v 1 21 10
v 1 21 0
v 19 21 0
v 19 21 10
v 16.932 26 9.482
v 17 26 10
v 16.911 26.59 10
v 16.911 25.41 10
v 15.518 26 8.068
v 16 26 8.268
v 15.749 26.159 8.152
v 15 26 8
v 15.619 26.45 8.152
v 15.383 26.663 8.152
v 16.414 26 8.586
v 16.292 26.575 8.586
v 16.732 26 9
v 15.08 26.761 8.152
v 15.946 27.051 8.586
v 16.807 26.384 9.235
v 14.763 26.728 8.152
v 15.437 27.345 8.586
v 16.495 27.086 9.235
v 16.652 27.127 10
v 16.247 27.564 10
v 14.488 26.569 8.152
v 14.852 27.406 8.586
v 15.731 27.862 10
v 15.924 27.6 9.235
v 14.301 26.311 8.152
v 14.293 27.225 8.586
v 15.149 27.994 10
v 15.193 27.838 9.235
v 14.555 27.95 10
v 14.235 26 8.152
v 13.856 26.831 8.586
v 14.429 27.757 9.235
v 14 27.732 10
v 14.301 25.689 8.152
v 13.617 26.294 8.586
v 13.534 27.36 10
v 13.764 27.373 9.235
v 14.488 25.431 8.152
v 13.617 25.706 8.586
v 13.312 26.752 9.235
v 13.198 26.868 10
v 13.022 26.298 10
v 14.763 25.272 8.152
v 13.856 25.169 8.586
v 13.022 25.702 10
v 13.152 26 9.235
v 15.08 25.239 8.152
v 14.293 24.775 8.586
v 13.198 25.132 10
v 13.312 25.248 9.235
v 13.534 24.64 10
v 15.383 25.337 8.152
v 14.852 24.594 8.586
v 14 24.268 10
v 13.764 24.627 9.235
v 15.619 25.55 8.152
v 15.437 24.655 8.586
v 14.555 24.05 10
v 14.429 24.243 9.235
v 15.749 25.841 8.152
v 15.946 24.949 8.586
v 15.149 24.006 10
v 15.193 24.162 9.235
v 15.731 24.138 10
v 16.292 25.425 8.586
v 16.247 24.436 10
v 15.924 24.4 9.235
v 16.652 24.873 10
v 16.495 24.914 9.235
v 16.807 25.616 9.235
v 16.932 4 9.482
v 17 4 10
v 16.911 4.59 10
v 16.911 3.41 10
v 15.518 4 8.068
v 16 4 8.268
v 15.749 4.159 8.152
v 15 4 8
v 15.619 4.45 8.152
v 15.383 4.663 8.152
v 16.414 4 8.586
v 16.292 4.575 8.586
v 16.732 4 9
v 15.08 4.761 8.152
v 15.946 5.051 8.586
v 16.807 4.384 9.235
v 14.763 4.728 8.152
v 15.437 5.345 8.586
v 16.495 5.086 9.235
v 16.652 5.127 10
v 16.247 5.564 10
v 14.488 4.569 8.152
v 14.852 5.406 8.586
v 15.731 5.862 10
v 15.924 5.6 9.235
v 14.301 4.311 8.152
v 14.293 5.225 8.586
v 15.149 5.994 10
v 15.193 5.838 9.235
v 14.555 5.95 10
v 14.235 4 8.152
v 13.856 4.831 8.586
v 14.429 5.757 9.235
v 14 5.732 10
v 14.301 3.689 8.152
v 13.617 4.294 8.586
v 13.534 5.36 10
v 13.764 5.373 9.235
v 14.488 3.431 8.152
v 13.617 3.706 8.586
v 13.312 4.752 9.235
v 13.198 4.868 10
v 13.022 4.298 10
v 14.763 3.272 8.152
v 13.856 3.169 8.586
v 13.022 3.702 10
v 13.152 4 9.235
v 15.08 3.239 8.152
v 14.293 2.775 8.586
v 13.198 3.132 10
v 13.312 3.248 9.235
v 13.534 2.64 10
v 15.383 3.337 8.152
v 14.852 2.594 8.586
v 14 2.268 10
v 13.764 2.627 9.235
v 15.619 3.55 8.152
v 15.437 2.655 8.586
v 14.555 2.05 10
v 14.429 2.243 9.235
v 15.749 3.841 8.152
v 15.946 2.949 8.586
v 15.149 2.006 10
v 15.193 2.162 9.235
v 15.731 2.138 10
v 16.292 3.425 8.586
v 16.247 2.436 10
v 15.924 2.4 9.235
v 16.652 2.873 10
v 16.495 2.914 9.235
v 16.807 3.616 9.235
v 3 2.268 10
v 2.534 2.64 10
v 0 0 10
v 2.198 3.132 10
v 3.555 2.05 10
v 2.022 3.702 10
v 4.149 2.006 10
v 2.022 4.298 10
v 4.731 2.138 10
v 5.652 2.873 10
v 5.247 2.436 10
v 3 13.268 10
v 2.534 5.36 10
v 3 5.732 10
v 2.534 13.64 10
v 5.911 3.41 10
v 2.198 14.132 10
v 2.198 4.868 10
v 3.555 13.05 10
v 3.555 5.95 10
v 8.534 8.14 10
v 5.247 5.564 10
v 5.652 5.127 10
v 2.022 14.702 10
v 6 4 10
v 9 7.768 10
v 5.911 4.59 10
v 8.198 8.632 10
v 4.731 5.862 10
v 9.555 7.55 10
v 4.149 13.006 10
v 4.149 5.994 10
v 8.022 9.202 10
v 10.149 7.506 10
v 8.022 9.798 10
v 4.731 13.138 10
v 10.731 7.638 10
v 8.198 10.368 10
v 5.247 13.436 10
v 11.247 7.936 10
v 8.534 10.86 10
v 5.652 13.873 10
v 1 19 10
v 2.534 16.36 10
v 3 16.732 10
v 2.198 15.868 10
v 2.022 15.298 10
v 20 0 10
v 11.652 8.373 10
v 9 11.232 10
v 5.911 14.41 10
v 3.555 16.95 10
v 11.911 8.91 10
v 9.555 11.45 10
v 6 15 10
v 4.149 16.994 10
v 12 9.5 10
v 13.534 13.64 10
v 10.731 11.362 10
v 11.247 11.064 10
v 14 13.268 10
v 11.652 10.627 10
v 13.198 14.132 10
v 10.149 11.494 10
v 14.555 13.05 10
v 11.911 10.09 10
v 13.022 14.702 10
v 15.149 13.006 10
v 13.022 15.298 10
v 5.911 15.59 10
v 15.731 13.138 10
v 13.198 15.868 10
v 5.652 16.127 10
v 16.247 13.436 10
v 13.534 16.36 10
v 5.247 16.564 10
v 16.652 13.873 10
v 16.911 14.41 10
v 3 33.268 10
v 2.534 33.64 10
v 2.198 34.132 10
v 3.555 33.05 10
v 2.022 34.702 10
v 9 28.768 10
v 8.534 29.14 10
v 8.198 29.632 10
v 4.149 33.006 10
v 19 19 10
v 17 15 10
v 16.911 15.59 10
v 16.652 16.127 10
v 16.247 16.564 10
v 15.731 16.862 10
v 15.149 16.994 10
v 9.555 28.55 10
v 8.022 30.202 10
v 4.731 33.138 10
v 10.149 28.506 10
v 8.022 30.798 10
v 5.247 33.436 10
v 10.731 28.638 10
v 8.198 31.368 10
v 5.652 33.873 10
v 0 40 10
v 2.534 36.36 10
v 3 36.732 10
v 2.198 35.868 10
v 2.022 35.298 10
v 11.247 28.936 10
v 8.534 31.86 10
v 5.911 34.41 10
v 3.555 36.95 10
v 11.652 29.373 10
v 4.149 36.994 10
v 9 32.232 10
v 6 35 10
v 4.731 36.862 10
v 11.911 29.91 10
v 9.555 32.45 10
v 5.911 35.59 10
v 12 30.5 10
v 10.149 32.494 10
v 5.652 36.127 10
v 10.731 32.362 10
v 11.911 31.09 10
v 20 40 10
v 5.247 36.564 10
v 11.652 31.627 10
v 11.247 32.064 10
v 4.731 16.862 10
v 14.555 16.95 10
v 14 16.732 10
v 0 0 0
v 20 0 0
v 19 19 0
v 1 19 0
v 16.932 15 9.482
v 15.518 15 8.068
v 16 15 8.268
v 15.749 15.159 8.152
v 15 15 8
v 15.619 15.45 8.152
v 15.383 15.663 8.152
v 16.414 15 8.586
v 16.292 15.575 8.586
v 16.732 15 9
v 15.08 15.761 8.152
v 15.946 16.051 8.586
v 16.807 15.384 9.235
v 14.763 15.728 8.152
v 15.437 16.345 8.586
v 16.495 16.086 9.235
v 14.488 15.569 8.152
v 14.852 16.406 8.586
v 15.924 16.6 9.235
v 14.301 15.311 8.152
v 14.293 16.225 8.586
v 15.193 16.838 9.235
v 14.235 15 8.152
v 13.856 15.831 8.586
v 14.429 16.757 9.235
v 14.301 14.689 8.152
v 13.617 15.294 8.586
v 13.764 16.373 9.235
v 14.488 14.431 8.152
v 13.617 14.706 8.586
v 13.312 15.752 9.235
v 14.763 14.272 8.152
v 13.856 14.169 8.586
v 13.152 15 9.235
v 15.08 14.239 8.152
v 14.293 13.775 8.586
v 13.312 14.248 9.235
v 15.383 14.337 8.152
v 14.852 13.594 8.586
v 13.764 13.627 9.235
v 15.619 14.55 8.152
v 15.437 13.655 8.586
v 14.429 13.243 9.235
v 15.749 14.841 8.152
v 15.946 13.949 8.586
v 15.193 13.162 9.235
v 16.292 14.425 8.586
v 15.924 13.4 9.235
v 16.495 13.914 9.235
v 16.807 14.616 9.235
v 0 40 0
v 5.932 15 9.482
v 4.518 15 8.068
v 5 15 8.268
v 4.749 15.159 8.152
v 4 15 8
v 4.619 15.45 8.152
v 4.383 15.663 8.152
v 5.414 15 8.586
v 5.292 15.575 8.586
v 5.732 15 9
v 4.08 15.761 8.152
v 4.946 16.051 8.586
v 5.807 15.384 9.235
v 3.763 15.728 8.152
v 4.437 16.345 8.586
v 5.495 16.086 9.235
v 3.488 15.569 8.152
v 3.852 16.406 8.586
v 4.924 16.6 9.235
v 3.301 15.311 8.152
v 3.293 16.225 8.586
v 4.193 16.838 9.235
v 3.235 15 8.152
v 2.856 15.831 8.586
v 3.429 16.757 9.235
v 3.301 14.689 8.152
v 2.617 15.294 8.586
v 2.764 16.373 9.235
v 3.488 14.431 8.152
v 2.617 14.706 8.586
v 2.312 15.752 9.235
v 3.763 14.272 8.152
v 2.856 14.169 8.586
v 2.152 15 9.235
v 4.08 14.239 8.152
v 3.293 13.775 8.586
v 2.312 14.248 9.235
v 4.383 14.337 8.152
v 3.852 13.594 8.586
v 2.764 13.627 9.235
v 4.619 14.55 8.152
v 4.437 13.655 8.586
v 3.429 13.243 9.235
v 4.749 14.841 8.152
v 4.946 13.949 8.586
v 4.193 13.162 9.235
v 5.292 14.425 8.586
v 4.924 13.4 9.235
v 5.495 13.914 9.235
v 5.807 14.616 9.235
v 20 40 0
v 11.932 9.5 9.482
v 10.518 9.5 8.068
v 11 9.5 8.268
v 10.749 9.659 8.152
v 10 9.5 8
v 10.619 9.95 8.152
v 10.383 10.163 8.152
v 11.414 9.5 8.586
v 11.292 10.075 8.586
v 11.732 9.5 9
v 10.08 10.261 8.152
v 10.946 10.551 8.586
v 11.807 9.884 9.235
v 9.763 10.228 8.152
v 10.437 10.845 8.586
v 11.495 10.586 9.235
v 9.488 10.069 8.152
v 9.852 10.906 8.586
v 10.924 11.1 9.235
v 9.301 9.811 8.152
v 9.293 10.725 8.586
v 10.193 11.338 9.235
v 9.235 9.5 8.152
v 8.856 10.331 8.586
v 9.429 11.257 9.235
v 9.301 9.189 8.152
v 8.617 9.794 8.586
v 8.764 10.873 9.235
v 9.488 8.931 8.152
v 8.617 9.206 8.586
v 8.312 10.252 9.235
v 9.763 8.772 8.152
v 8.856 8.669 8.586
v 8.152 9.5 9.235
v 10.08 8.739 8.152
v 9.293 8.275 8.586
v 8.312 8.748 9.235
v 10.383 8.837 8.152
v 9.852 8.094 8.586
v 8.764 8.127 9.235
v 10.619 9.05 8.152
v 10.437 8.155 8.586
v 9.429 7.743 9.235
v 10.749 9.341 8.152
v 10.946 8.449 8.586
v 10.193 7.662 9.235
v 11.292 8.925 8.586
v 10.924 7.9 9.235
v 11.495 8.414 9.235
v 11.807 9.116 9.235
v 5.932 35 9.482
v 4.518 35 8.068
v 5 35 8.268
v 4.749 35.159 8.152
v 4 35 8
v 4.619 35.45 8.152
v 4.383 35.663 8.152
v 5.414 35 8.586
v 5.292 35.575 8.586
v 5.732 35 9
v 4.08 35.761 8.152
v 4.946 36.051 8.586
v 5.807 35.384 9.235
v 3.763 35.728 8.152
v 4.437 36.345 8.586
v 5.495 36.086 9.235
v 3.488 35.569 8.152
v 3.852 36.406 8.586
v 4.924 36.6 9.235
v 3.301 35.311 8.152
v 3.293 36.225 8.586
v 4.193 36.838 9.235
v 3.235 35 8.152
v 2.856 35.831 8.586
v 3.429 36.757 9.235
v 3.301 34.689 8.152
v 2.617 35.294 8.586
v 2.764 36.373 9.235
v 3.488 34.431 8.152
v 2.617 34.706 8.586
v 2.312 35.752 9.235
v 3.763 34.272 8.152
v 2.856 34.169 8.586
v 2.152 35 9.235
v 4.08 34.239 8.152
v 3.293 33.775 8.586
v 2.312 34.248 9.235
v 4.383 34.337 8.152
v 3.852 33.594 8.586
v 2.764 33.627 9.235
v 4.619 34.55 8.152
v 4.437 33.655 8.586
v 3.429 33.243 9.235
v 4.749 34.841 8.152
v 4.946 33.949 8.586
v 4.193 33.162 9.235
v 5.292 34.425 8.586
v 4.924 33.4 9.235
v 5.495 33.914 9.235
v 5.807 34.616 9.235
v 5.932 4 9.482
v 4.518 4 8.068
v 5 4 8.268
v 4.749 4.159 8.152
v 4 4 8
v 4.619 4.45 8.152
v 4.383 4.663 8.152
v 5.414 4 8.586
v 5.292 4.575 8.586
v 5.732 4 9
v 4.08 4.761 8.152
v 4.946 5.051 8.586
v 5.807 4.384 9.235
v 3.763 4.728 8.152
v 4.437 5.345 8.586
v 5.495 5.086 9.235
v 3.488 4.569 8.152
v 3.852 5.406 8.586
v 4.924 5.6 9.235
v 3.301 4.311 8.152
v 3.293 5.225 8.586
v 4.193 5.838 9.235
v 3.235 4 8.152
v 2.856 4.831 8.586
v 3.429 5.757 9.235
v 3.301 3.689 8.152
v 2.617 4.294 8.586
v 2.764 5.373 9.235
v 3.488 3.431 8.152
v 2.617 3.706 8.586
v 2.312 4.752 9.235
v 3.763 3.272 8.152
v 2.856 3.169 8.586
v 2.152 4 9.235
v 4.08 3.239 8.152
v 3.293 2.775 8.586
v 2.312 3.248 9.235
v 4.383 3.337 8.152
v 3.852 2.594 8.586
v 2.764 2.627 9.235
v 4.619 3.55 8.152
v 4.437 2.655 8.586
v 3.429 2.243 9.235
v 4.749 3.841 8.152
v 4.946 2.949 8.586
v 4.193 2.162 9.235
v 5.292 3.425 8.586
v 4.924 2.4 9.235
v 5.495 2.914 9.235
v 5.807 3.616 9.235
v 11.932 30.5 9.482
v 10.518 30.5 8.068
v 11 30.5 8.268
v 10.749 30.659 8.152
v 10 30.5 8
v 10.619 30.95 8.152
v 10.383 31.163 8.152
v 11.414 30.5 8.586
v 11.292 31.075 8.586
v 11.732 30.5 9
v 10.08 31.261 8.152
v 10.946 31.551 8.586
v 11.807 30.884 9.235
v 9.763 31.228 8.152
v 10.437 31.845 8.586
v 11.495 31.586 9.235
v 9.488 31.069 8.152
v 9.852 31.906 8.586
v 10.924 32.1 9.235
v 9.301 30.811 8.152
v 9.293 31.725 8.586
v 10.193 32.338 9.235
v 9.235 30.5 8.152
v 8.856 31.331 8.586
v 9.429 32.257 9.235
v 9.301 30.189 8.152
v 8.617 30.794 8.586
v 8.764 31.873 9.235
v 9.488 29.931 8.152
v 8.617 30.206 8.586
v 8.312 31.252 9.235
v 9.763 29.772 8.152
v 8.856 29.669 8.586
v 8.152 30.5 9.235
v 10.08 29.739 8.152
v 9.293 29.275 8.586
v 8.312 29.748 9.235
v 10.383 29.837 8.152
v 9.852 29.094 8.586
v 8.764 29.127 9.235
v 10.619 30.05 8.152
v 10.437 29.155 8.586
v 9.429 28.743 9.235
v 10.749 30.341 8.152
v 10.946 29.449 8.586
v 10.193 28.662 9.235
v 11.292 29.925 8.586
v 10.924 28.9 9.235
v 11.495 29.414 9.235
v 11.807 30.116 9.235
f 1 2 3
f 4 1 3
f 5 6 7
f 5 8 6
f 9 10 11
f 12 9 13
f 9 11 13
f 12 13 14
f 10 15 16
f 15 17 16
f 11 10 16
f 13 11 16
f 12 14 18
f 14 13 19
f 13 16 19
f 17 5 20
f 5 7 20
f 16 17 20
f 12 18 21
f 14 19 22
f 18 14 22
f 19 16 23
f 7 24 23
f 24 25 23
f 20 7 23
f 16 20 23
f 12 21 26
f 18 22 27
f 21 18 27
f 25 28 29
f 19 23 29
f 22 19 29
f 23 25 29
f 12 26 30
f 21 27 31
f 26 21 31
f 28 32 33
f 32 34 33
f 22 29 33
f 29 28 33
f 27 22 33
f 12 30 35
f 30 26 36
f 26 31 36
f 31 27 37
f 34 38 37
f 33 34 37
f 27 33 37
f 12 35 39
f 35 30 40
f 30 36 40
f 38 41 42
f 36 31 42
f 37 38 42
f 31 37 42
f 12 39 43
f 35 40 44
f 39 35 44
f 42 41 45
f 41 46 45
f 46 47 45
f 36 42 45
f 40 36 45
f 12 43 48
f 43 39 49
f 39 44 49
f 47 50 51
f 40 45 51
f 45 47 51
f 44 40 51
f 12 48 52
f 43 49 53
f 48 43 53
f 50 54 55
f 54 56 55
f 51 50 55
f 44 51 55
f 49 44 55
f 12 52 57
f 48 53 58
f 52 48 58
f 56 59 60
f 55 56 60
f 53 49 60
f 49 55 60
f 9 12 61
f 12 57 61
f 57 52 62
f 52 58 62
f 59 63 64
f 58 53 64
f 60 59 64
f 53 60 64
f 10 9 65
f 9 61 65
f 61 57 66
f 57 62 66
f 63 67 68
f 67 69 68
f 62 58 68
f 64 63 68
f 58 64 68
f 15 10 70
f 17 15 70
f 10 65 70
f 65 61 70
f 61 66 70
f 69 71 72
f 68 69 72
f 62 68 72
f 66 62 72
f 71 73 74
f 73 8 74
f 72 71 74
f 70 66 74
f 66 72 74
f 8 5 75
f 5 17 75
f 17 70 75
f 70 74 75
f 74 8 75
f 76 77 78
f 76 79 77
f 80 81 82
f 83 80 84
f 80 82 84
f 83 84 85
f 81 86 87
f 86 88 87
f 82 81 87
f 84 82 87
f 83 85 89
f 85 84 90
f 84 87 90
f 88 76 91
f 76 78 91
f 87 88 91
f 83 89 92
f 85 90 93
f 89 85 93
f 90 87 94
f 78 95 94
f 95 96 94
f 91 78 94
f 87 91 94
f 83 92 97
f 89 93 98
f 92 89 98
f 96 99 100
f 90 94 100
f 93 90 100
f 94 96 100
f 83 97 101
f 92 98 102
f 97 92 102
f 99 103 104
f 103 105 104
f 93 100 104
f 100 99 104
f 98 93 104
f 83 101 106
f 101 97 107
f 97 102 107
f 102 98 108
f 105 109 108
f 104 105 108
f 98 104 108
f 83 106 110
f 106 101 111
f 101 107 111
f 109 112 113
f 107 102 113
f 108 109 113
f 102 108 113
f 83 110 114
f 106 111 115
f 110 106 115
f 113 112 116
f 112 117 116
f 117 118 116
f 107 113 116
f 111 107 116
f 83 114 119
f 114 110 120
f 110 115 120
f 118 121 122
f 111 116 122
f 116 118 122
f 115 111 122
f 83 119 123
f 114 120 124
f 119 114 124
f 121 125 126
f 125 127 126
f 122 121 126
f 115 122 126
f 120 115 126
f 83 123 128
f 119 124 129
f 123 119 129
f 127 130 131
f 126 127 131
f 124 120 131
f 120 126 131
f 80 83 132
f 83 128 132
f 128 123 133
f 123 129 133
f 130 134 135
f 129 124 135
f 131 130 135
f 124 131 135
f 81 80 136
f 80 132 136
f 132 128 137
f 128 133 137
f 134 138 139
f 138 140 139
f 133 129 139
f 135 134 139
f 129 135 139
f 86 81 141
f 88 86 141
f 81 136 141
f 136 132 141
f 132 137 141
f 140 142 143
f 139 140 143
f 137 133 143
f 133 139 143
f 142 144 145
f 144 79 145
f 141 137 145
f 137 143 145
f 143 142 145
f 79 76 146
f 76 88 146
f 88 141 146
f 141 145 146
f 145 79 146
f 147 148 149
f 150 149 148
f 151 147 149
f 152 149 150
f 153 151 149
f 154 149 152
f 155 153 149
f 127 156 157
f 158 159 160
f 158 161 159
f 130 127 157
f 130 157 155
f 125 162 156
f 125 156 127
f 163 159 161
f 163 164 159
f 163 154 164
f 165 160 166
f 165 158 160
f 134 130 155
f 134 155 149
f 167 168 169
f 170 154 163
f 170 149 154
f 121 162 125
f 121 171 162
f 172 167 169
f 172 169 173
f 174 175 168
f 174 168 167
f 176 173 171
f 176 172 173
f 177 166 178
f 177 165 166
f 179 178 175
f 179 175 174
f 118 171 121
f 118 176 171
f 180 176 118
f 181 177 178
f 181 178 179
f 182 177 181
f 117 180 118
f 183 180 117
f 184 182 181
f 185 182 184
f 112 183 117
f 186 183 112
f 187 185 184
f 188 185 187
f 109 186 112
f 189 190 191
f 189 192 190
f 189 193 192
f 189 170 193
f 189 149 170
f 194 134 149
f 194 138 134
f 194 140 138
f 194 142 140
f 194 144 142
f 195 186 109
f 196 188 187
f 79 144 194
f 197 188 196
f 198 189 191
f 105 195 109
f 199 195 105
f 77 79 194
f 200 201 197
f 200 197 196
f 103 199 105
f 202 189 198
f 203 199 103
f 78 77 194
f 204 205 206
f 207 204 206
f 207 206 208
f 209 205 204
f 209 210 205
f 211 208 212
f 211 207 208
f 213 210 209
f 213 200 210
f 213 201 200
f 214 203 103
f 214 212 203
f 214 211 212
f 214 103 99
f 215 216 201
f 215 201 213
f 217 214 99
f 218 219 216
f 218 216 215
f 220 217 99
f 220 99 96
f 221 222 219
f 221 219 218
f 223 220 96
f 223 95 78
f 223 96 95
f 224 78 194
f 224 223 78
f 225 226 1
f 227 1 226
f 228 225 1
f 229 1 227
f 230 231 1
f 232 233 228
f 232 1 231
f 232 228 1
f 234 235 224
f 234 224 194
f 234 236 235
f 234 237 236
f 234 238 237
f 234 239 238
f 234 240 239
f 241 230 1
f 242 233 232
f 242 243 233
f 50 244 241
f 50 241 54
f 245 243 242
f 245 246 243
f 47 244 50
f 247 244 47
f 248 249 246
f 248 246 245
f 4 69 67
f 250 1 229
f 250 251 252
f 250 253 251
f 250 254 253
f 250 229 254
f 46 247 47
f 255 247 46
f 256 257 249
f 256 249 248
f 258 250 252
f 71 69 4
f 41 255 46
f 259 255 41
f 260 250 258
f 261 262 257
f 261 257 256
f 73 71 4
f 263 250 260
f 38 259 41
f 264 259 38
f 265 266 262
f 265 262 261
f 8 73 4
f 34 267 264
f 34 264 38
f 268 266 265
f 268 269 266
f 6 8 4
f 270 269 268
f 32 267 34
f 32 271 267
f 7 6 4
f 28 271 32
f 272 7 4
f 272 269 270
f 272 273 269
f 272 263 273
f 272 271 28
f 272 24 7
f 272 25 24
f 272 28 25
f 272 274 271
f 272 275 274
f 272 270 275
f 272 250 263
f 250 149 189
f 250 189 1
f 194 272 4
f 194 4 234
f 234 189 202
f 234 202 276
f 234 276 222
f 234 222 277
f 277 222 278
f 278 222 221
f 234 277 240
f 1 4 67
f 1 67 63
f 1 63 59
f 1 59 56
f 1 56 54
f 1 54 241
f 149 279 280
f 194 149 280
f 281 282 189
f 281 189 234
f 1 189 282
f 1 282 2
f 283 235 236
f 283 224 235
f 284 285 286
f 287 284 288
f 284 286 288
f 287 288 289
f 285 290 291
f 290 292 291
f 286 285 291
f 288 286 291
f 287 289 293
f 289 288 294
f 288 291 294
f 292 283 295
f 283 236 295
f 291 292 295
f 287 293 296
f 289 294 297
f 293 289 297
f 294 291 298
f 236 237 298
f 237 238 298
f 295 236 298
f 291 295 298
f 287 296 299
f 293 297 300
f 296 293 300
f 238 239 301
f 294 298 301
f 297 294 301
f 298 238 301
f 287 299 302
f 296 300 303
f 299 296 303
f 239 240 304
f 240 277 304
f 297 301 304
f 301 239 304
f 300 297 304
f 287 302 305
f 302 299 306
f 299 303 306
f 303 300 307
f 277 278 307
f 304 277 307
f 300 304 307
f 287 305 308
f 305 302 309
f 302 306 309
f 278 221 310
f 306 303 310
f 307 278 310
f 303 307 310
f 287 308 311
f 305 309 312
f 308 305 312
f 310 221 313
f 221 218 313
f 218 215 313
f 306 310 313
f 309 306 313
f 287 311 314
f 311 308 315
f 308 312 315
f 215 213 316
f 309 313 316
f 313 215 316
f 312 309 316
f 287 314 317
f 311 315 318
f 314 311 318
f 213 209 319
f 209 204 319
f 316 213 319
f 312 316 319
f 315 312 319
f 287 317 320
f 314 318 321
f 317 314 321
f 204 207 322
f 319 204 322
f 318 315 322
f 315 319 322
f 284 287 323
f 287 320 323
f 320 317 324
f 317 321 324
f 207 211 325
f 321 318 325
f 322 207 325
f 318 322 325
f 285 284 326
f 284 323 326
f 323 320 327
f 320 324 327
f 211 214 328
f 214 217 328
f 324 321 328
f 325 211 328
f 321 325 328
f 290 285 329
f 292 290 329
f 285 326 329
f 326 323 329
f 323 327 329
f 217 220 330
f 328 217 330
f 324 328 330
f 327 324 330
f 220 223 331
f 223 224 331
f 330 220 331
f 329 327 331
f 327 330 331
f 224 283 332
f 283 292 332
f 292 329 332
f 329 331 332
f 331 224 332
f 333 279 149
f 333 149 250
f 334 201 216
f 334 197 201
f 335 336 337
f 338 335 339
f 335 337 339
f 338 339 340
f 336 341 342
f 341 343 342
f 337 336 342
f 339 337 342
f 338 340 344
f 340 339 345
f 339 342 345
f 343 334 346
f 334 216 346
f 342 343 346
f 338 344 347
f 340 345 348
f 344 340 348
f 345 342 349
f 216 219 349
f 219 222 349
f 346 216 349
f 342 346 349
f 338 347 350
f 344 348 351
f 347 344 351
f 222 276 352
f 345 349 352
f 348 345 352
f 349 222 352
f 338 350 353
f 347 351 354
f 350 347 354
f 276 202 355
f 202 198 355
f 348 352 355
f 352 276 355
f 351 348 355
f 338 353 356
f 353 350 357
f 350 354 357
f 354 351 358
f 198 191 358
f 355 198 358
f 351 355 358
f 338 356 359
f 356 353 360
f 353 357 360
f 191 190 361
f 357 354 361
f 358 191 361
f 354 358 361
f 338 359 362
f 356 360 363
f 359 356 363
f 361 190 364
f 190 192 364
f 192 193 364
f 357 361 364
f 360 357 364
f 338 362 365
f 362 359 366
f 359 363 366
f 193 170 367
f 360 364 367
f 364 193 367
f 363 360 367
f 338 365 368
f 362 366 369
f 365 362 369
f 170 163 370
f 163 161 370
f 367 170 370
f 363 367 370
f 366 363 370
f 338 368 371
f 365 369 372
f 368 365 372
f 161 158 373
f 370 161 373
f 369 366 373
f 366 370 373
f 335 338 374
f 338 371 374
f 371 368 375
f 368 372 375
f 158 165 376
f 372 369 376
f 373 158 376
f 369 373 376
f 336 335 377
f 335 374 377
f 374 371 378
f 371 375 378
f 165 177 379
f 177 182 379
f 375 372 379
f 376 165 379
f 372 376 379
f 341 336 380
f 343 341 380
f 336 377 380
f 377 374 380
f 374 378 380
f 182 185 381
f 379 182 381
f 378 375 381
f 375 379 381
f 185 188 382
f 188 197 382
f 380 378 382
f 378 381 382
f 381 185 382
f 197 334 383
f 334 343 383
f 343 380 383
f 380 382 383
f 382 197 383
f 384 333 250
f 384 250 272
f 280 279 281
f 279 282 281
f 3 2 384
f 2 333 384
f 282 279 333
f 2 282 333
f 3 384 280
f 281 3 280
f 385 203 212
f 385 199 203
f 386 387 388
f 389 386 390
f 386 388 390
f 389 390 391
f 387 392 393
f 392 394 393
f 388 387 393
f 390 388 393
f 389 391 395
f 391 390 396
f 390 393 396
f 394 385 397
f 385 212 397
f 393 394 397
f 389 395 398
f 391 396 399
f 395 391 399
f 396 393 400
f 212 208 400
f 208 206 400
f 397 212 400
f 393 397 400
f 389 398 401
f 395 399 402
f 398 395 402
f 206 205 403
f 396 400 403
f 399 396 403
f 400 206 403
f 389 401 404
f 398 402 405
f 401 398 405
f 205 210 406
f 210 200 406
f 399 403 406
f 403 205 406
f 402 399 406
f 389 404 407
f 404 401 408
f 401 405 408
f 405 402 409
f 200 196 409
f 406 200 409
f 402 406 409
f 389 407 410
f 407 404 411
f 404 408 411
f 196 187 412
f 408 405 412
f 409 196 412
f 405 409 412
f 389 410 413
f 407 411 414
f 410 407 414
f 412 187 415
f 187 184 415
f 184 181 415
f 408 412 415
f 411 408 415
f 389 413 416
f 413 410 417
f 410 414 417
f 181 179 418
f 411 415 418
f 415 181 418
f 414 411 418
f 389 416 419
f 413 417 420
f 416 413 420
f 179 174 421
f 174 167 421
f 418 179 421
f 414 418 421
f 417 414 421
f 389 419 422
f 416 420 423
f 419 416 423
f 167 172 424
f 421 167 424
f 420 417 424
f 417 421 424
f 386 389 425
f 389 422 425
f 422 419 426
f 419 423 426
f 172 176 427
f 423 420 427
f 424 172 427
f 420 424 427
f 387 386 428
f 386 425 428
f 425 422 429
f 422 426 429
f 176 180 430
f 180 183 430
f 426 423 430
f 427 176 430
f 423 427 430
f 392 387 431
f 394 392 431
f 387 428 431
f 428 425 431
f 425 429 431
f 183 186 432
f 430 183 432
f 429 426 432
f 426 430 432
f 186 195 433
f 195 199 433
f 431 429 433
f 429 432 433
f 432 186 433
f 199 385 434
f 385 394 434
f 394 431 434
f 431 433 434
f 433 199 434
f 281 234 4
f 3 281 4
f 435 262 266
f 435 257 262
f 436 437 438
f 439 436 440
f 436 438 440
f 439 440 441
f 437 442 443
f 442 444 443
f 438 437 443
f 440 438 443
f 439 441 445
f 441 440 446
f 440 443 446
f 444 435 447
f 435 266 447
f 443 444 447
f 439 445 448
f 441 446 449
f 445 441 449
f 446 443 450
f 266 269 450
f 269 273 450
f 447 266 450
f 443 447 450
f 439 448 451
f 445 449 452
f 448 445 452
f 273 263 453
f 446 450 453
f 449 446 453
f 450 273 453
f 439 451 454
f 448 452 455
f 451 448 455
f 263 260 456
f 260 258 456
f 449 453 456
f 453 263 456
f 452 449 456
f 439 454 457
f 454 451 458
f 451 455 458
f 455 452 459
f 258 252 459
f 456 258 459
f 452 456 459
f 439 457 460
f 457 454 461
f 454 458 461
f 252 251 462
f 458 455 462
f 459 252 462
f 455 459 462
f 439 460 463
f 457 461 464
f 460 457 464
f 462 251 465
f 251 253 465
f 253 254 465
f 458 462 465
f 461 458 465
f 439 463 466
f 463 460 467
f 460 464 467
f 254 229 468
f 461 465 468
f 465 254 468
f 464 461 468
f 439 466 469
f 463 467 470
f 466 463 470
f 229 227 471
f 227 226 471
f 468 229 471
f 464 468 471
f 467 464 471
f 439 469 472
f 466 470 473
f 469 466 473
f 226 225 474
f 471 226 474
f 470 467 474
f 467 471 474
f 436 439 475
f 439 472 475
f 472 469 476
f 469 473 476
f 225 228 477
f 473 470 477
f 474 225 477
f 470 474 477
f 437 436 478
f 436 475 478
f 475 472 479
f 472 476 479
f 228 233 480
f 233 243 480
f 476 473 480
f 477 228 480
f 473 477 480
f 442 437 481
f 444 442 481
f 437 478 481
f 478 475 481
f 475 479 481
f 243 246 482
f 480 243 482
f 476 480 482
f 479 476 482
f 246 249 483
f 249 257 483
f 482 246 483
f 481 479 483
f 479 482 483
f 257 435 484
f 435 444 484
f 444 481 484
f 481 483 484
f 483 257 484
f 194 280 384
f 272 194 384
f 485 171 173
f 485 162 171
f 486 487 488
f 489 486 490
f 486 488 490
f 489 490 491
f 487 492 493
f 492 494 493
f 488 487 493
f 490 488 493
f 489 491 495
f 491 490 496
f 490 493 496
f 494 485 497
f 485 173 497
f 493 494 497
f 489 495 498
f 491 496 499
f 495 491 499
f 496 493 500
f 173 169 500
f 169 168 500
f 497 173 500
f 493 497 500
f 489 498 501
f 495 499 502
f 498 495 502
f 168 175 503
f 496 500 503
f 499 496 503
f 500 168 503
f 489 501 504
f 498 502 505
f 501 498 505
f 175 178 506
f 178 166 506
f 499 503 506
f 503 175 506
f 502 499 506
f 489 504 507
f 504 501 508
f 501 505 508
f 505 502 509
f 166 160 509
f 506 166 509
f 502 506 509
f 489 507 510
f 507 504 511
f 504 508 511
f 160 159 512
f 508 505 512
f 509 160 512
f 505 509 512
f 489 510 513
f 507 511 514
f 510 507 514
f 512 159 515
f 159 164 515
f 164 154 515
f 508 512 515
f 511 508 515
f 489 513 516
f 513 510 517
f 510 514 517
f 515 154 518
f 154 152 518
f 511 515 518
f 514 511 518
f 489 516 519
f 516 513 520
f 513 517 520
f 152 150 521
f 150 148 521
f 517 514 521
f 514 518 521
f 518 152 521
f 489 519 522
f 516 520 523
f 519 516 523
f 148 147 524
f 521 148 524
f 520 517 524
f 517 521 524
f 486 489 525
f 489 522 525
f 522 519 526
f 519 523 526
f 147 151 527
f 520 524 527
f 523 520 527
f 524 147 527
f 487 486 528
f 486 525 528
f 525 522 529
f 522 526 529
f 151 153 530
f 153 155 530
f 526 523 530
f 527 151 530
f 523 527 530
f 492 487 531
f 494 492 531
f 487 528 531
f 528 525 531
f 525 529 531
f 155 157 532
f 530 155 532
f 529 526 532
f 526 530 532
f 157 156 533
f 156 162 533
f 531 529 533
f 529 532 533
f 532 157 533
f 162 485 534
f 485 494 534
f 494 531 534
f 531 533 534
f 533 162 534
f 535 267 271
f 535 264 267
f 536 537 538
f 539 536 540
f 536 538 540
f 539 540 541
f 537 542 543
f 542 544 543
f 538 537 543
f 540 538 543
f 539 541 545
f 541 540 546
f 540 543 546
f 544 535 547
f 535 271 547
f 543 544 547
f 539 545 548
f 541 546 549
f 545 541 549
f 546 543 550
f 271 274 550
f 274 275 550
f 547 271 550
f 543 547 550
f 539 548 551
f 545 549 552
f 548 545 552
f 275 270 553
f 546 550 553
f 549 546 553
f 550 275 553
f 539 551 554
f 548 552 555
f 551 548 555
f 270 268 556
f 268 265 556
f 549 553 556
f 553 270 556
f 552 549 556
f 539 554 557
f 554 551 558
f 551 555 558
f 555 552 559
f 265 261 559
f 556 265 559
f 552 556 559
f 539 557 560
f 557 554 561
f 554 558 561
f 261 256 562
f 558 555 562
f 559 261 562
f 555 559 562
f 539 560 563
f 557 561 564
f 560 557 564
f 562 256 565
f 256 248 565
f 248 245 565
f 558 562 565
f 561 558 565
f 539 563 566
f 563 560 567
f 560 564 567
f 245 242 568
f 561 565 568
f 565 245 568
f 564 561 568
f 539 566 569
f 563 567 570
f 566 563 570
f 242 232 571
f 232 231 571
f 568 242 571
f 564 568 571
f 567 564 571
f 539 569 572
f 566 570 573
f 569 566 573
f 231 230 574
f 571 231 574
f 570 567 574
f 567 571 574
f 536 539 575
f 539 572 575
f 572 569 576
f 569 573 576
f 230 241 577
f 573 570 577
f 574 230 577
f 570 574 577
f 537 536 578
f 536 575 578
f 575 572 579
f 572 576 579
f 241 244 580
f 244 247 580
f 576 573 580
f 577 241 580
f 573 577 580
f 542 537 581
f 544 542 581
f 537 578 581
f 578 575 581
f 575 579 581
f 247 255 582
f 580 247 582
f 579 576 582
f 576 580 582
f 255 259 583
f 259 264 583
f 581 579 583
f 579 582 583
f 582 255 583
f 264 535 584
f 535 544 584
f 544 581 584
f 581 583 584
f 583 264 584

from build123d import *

# Parameters (mm, degrees)
BOX001_W     = 18
BOX001_H     = 2
BOX001_DEPTH = 10
BOX_W        = 20
BOX_H        = 40
BOX_DEPTH    = 10


with BuildPart() as sphere001:
    # Sphere001 → Sphere001 (revolve)
    with BuildSketch(Plane(origin=(4, 4, 10), x_dir=(1, 0, 0), z_dir=(0, -1, 0))):
        with BuildLine():
            ThreePointArc((0, -2), (2, 0), (0, 2))
            Line((0, 2), (0, -2))
        make_face()
    revolve(axis=Axis((4, 4, 10), (0, 0, 1)))


with BuildPart() as sphere002:
    # Sphere002 → Sphere002 (revolve)
    with BuildSketch(Plane(origin=(15, 4, 10), x_dir=(1, 0, 0), z_dir=(0, -1, 0))):
        with BuildLine():
            ThreePointArc((0, -2), (2, 0), (0, 2))
            Line((0, 2), (0, -2))
        make_face()
    revolve(axis=Axis((15, 4, 10), (0, 0, 1)))


with BuildPart() as sphere003:
    # Sphere003 → Sphere003 (revolve)
    with BuildSketch(Plane(origin=(4, 35, 10), x_dir=(1, 0, 0), z_dir=(0, -1, 0))):
        with BuildLine():
            ThreePointArc((0, -2), (2, 0), (0, 2))
            Line((0, 2), (0, -2))
        make_face()
    revolve(axis=Axis((4, 35, 10), (0, 0, 1)))


with BuildPart() as sphere004:
    # Sphere004 → Sphere004 (revolve)
    with BuildSketch(Plane(origin=(15, 15, 10), x_dir=(1, 0, 0), z_dir=(0, -1, 0))):
        with BuildLine():
            ThreePointArc((0, -2), (2, 0), (0, 2))
            Line((0, 2), (0, -2))
        make_face()
    revolve(axis=Axis((15, 15, 10), (0, 0, 1)))


with BuildPart() as sphere005:
    # Sphere005 → Sphere005 (revolve)
    with BuildSketch(Plane(origin=(10, 30.5, 10), x_dir=(1, 0, 0), z_dir=(0, -1, 0))):
        with BuildLine():
            ThreePointArc((0, -2), (2, 0), (0, 2))
            Line((0, 2), (0, -2))
        make_face()
    revolve(axis=Axis((10, 30.5, 10), (0, 0, 1)))


with BuildPart() as sphere006:
    # Sphere006 → Sphere006 (revolve)
    with BuildSketch(Plane(origin=(4, 15, 10), x_dir=(1, 0, 0), z_dir=(0, -1, 0))):
        with BuildLine():
            ThreePointArc((0, -2), (2, 0), (0, 2))
            Line((0, 2), (0, -2))
        make_face()
    revolve(axis=Axis((4, 15, 10), (0, 0, 1)))


with BuildPart() as sphere007:
    # Sphere007 → Sphere007 (revolve)
    with BuildSketch(Plane(origin=(15, 26, 10), x_dir=(1, 0, 0), z_dir=(0, -1, 0))):
        with BuildLine():
            ThreePointArc((0, -2), (2, 0), (0, 2))
            Line((0, 2), (0, -2))
        make_face()
    revolve(axis=Axis((15, 26, 10), (0, 0, 1)))


with BuildPart() as sphere:
    # Sphere → Sphere (revolve)
    with BuildSketch(Plane(origin=(10, 9.5, 10), x_dir=(1, 0, 0), z_dir=(0, -1, 0))):
        with BuildLine():
            ThreePointArc((0, -2), (2, 0), (0, 2))
            Line((0, 2), (0, -2))
        make_face()
    revolve(axis=Axis((10, 9.5, 10), (0, 0, 1)))


with BuildPart() as cube001:
    # Box001 → Box001 (new body)
    with BuildSketch(Plane(origin=(1, 19, 0), x_dir=(1, 0, 0), z_dir=(0, 0, 1))):
        with Locations((9, 1)):
            Rectangle(BOX001_W, BOX001_H)
    extrude(amount=BOX001_DEPTH)


with BuildPart() as cut008:
    # Box → Box (new body)
    with BuildSketch(Plane.XY):
        with Locations((10, 20)):
            Rectangle(BOX_W, BOX_H)
    extrude(amount=BOX_DEPTH)

    # Cut: cut Cube001
    add(cube001.part, mode=Mode.SUBTRACT)

    # Cut001: cut Sphere
    add(sphere.part, mode=Mode.SUBTRACT)

    # Cut002: cut Sphere007
    add(sphere007.part, mode=Mode.SUBTRACT)

    # Cut003: cut Sphere006
    add(sphere006.part, mode=Mode.SUBTRACT)

    # Cut004: cut Sphere005
    add(sphere005.part, mode=Mode.SUBTRACT)

    # Cut005: cut Sphere004
    add(sphere004.part, mode=Mode.SUBTRACT)

    # Cut006: cut Sphere003
    add(sphere003.part, mode=Mode.SUBTRACT)

    # Cut007: cut Sphere002
    add(sphere002.part, mode=Mode.SUBTRACT)

    # Cut008: cut Sphere001
    add(sphere001.part, mode=Mode.SUBTRACT)


solid = cut008.part
